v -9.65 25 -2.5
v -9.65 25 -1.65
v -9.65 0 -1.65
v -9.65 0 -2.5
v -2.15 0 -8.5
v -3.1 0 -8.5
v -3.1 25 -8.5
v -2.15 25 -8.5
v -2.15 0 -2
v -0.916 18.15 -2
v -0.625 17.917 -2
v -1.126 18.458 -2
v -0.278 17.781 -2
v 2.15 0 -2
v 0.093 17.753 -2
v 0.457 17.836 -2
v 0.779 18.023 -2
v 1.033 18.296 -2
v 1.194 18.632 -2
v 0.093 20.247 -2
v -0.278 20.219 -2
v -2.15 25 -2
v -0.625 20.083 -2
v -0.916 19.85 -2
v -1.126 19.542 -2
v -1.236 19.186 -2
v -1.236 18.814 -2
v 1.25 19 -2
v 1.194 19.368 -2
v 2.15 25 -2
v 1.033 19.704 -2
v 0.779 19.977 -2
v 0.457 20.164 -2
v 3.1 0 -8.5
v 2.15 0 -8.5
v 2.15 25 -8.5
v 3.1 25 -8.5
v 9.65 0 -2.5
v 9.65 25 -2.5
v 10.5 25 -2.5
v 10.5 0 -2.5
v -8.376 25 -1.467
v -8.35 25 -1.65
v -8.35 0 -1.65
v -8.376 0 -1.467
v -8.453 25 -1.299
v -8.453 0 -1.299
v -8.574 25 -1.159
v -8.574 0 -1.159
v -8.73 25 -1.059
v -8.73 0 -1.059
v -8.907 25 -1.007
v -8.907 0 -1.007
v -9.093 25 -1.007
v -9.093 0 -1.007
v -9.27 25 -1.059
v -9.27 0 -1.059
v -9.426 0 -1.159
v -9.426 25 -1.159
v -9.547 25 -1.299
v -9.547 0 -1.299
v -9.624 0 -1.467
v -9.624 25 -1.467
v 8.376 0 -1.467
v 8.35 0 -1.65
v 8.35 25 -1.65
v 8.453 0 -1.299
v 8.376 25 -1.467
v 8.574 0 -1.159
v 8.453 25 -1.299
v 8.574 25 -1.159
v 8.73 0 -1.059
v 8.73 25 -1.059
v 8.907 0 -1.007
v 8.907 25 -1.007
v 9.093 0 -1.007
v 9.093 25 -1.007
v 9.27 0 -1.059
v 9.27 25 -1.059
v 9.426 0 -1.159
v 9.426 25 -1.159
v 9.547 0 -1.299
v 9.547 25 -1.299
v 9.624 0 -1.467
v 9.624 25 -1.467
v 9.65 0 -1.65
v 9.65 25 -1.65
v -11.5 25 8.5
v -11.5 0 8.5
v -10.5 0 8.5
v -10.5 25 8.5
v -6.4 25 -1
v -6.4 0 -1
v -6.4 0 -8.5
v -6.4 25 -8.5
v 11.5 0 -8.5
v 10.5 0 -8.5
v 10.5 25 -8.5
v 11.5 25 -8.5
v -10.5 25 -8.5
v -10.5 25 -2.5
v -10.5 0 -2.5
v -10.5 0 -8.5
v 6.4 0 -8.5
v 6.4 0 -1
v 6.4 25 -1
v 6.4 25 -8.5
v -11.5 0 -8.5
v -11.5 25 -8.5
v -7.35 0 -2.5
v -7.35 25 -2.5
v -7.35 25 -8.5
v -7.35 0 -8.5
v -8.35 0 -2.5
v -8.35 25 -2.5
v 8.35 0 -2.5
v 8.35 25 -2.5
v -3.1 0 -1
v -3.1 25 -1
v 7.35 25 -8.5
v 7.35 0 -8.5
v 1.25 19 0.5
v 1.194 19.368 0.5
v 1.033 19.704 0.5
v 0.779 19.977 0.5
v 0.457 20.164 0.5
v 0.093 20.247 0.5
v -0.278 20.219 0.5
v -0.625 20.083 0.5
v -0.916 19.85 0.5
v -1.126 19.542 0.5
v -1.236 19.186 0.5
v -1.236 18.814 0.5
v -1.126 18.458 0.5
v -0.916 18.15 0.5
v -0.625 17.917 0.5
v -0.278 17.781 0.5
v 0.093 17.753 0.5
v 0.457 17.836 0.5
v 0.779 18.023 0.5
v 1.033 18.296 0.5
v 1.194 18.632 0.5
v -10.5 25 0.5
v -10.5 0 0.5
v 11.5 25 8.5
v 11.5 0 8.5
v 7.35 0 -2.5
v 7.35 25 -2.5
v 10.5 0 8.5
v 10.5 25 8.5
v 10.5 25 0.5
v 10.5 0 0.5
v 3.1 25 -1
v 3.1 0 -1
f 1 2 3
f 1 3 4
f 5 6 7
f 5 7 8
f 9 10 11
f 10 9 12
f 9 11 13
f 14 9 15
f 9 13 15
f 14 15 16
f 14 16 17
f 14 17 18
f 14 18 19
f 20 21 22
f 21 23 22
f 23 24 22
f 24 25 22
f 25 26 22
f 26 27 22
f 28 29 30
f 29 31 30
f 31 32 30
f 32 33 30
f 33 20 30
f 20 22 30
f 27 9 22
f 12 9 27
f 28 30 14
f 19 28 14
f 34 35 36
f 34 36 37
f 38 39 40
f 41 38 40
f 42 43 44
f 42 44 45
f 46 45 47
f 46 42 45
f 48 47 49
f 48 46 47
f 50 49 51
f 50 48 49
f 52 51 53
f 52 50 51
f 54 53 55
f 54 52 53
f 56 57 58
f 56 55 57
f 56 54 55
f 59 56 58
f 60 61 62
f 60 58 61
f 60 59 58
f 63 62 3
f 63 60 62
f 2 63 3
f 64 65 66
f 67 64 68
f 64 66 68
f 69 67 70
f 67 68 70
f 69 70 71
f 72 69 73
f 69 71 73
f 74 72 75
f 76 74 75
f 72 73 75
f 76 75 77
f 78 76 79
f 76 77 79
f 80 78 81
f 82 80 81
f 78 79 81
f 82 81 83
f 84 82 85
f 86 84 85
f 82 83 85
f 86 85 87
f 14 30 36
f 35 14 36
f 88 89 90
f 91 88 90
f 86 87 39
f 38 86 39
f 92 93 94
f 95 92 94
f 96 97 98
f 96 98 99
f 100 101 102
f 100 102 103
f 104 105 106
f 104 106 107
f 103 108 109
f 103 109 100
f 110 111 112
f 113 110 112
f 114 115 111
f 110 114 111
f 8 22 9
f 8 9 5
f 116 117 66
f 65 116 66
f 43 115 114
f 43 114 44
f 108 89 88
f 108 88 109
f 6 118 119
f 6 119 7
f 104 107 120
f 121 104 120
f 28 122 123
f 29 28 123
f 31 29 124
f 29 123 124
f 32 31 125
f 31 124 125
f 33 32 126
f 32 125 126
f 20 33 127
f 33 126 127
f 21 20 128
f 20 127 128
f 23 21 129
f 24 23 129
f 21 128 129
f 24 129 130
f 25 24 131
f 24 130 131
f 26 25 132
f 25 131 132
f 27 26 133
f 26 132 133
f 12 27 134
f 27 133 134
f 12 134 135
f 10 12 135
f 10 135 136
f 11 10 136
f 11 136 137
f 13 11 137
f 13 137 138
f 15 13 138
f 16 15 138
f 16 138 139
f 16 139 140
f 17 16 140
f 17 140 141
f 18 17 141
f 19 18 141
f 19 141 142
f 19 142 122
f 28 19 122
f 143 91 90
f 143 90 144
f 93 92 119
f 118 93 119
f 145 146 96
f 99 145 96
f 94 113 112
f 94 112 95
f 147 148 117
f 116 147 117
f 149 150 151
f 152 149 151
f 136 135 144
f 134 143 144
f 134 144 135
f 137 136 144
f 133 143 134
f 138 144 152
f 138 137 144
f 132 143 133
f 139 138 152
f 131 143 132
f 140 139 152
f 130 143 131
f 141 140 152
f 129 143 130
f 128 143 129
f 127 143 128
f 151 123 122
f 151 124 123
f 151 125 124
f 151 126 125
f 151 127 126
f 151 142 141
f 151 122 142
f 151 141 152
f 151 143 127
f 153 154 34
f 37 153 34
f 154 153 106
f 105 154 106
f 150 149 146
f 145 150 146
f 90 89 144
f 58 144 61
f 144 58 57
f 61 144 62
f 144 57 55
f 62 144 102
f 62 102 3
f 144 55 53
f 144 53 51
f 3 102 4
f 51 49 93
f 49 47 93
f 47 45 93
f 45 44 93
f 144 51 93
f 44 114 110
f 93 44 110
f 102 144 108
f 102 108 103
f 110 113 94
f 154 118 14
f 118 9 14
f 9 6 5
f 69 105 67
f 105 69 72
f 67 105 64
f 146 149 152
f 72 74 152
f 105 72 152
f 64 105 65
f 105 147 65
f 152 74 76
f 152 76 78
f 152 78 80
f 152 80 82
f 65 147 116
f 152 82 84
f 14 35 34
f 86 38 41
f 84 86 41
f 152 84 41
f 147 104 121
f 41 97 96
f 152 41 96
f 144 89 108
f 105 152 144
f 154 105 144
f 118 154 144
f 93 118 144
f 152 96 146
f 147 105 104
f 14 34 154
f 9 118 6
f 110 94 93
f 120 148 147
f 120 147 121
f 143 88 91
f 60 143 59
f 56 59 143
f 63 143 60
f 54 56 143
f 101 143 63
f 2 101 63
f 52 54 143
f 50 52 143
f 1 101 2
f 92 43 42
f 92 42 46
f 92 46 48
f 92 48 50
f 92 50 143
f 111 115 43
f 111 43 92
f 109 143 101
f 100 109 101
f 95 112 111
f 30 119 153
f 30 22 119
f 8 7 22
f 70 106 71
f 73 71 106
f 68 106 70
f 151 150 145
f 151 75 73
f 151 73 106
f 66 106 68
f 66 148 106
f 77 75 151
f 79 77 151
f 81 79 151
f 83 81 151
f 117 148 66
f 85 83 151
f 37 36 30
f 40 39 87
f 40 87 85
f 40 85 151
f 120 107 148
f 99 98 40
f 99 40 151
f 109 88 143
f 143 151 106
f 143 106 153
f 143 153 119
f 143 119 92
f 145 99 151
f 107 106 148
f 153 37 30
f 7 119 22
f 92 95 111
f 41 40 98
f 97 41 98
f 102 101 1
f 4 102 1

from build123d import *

# Parameters (mm, degrees)
SKETCH1_W           = 23
SKETCH1_H           = 17
BOSS_EXTRUDE1_DEPTH = 25
SKETCH2_W           = 21
SKETCH2_H           = 8
SKETCH2_W_2         = 3.15
SKETCH2_H_2         = 6
SKETCH2_W_3         = 3.3
SKETCH2_H_3         = 7.5
SKETCH2_W_4         = 4.3
SKETCH2_H_4         = 6.5
CUT_EXTRUDE1_DEPTH  = 29.801041648
CUT_EXTRUDE2_DEPTH  = 29.801041648
CUT_EXTRUDE3_REACH  = 30.953
SKETCH4_R           = 1.25


with BuildPart() as part:
    # Sketch1 → Boss-Extrude1 (new body)
    with BuildSketch(Plane(origin=(0, 0, 0), x_dir=(1, 0, 0), z_dir=(0, 1, 0))):
        Rectangle(SKETCH1_W, SKETCH1_H)
    extrude(amount=BOSS_EXTRUDE1_DEPTH)

    # Sketch2 → Cut-Extrude1 (cut, through all)
    with BuildSketch(Plane(origin=(0, 25, 0), x_dir=(1, 0, 0), z_dir=(0, 1, 0))):
        with Locations((0, -4.5)):
            Rectangle(SKETCH2_W, SKETCH2_H)
        with Locations((-8.925, 5.5)):
            Rectangle(SKETCH2_W_2, SKETCH2_H_2)
        with Locations((-4.75, 4.75)):
            Rectangle(SKETCH2_W_3, SKETCH2_H_3)
        with Locations((0, 5.25)):
            Rectangle(SKETCH2_W_4, SKETCH2_H_4)
        with Locations((4.75, 4.75)):
            Rectangle(SKETCH2_W_3, SKETCH2_H_3)
        with Locations((8.925, 5.5)):
            Rectangle(SKETCH2_W_2, SKETCH2_H_2)
    extrude(amount=-CUT_EXTRUDE1_DEPTH, mode=Mode.SUBTRACT)

    # Sketch3 → Cut-Extrude2 (cut, through all)
    with BuildSketch(Plane(origin=(0, 25, 0), x_dir=(1, 0, 0), z_dir=(0, 1, 0))):
        with BuildLine():
            Line((8.35, 2.5), (8.35, 1.65))
            ThreePointArc((8.35, 1.65), (9, 1), (9.65, 1.65))
            Line((9.65, 1.65), (9.65, 2.5))
            Line((9.65, 2.5), (8.35, 2.5))
        make_face()
        with BuildLine():
            Line((-8.35, 2.5), (-8.35, 1.65))
            ThreePointArc((-8.35, 1.65), (-9, 1), (-9.65, 1.65))
            Line((-9.65, 1.65), (-9.65, 2.5))
            Line((-9.65, 2.5), (-8.35, 2.5))
        make_face()
    extrude(amount=-CUT_EXTRUDE2_DEPTH, mode=Mode.SUBTRACT)

    # Sketch4 → Cut-Extrude3 (cut, up to next)
    with BuildSketch(Plane.XY.offset(0.5), mode=Mode.PRIVATE) as cut_extrude3_sk1:
        with Locations((0, 19)):
            Circle(SKETCH4_R)
    cut_extrude3_tool1 = extrude(cut_extrude3_sk1.sketch, amount=-CUT_EXTRUDE3_REACH, mode=Mode.PRIVATE) & part.part
    add(cut_extrude3_tool1.solids().sort_by_distance((0, 19, 0.5))[0], mode=Mode.SUBTRACT)


solid = part.part
